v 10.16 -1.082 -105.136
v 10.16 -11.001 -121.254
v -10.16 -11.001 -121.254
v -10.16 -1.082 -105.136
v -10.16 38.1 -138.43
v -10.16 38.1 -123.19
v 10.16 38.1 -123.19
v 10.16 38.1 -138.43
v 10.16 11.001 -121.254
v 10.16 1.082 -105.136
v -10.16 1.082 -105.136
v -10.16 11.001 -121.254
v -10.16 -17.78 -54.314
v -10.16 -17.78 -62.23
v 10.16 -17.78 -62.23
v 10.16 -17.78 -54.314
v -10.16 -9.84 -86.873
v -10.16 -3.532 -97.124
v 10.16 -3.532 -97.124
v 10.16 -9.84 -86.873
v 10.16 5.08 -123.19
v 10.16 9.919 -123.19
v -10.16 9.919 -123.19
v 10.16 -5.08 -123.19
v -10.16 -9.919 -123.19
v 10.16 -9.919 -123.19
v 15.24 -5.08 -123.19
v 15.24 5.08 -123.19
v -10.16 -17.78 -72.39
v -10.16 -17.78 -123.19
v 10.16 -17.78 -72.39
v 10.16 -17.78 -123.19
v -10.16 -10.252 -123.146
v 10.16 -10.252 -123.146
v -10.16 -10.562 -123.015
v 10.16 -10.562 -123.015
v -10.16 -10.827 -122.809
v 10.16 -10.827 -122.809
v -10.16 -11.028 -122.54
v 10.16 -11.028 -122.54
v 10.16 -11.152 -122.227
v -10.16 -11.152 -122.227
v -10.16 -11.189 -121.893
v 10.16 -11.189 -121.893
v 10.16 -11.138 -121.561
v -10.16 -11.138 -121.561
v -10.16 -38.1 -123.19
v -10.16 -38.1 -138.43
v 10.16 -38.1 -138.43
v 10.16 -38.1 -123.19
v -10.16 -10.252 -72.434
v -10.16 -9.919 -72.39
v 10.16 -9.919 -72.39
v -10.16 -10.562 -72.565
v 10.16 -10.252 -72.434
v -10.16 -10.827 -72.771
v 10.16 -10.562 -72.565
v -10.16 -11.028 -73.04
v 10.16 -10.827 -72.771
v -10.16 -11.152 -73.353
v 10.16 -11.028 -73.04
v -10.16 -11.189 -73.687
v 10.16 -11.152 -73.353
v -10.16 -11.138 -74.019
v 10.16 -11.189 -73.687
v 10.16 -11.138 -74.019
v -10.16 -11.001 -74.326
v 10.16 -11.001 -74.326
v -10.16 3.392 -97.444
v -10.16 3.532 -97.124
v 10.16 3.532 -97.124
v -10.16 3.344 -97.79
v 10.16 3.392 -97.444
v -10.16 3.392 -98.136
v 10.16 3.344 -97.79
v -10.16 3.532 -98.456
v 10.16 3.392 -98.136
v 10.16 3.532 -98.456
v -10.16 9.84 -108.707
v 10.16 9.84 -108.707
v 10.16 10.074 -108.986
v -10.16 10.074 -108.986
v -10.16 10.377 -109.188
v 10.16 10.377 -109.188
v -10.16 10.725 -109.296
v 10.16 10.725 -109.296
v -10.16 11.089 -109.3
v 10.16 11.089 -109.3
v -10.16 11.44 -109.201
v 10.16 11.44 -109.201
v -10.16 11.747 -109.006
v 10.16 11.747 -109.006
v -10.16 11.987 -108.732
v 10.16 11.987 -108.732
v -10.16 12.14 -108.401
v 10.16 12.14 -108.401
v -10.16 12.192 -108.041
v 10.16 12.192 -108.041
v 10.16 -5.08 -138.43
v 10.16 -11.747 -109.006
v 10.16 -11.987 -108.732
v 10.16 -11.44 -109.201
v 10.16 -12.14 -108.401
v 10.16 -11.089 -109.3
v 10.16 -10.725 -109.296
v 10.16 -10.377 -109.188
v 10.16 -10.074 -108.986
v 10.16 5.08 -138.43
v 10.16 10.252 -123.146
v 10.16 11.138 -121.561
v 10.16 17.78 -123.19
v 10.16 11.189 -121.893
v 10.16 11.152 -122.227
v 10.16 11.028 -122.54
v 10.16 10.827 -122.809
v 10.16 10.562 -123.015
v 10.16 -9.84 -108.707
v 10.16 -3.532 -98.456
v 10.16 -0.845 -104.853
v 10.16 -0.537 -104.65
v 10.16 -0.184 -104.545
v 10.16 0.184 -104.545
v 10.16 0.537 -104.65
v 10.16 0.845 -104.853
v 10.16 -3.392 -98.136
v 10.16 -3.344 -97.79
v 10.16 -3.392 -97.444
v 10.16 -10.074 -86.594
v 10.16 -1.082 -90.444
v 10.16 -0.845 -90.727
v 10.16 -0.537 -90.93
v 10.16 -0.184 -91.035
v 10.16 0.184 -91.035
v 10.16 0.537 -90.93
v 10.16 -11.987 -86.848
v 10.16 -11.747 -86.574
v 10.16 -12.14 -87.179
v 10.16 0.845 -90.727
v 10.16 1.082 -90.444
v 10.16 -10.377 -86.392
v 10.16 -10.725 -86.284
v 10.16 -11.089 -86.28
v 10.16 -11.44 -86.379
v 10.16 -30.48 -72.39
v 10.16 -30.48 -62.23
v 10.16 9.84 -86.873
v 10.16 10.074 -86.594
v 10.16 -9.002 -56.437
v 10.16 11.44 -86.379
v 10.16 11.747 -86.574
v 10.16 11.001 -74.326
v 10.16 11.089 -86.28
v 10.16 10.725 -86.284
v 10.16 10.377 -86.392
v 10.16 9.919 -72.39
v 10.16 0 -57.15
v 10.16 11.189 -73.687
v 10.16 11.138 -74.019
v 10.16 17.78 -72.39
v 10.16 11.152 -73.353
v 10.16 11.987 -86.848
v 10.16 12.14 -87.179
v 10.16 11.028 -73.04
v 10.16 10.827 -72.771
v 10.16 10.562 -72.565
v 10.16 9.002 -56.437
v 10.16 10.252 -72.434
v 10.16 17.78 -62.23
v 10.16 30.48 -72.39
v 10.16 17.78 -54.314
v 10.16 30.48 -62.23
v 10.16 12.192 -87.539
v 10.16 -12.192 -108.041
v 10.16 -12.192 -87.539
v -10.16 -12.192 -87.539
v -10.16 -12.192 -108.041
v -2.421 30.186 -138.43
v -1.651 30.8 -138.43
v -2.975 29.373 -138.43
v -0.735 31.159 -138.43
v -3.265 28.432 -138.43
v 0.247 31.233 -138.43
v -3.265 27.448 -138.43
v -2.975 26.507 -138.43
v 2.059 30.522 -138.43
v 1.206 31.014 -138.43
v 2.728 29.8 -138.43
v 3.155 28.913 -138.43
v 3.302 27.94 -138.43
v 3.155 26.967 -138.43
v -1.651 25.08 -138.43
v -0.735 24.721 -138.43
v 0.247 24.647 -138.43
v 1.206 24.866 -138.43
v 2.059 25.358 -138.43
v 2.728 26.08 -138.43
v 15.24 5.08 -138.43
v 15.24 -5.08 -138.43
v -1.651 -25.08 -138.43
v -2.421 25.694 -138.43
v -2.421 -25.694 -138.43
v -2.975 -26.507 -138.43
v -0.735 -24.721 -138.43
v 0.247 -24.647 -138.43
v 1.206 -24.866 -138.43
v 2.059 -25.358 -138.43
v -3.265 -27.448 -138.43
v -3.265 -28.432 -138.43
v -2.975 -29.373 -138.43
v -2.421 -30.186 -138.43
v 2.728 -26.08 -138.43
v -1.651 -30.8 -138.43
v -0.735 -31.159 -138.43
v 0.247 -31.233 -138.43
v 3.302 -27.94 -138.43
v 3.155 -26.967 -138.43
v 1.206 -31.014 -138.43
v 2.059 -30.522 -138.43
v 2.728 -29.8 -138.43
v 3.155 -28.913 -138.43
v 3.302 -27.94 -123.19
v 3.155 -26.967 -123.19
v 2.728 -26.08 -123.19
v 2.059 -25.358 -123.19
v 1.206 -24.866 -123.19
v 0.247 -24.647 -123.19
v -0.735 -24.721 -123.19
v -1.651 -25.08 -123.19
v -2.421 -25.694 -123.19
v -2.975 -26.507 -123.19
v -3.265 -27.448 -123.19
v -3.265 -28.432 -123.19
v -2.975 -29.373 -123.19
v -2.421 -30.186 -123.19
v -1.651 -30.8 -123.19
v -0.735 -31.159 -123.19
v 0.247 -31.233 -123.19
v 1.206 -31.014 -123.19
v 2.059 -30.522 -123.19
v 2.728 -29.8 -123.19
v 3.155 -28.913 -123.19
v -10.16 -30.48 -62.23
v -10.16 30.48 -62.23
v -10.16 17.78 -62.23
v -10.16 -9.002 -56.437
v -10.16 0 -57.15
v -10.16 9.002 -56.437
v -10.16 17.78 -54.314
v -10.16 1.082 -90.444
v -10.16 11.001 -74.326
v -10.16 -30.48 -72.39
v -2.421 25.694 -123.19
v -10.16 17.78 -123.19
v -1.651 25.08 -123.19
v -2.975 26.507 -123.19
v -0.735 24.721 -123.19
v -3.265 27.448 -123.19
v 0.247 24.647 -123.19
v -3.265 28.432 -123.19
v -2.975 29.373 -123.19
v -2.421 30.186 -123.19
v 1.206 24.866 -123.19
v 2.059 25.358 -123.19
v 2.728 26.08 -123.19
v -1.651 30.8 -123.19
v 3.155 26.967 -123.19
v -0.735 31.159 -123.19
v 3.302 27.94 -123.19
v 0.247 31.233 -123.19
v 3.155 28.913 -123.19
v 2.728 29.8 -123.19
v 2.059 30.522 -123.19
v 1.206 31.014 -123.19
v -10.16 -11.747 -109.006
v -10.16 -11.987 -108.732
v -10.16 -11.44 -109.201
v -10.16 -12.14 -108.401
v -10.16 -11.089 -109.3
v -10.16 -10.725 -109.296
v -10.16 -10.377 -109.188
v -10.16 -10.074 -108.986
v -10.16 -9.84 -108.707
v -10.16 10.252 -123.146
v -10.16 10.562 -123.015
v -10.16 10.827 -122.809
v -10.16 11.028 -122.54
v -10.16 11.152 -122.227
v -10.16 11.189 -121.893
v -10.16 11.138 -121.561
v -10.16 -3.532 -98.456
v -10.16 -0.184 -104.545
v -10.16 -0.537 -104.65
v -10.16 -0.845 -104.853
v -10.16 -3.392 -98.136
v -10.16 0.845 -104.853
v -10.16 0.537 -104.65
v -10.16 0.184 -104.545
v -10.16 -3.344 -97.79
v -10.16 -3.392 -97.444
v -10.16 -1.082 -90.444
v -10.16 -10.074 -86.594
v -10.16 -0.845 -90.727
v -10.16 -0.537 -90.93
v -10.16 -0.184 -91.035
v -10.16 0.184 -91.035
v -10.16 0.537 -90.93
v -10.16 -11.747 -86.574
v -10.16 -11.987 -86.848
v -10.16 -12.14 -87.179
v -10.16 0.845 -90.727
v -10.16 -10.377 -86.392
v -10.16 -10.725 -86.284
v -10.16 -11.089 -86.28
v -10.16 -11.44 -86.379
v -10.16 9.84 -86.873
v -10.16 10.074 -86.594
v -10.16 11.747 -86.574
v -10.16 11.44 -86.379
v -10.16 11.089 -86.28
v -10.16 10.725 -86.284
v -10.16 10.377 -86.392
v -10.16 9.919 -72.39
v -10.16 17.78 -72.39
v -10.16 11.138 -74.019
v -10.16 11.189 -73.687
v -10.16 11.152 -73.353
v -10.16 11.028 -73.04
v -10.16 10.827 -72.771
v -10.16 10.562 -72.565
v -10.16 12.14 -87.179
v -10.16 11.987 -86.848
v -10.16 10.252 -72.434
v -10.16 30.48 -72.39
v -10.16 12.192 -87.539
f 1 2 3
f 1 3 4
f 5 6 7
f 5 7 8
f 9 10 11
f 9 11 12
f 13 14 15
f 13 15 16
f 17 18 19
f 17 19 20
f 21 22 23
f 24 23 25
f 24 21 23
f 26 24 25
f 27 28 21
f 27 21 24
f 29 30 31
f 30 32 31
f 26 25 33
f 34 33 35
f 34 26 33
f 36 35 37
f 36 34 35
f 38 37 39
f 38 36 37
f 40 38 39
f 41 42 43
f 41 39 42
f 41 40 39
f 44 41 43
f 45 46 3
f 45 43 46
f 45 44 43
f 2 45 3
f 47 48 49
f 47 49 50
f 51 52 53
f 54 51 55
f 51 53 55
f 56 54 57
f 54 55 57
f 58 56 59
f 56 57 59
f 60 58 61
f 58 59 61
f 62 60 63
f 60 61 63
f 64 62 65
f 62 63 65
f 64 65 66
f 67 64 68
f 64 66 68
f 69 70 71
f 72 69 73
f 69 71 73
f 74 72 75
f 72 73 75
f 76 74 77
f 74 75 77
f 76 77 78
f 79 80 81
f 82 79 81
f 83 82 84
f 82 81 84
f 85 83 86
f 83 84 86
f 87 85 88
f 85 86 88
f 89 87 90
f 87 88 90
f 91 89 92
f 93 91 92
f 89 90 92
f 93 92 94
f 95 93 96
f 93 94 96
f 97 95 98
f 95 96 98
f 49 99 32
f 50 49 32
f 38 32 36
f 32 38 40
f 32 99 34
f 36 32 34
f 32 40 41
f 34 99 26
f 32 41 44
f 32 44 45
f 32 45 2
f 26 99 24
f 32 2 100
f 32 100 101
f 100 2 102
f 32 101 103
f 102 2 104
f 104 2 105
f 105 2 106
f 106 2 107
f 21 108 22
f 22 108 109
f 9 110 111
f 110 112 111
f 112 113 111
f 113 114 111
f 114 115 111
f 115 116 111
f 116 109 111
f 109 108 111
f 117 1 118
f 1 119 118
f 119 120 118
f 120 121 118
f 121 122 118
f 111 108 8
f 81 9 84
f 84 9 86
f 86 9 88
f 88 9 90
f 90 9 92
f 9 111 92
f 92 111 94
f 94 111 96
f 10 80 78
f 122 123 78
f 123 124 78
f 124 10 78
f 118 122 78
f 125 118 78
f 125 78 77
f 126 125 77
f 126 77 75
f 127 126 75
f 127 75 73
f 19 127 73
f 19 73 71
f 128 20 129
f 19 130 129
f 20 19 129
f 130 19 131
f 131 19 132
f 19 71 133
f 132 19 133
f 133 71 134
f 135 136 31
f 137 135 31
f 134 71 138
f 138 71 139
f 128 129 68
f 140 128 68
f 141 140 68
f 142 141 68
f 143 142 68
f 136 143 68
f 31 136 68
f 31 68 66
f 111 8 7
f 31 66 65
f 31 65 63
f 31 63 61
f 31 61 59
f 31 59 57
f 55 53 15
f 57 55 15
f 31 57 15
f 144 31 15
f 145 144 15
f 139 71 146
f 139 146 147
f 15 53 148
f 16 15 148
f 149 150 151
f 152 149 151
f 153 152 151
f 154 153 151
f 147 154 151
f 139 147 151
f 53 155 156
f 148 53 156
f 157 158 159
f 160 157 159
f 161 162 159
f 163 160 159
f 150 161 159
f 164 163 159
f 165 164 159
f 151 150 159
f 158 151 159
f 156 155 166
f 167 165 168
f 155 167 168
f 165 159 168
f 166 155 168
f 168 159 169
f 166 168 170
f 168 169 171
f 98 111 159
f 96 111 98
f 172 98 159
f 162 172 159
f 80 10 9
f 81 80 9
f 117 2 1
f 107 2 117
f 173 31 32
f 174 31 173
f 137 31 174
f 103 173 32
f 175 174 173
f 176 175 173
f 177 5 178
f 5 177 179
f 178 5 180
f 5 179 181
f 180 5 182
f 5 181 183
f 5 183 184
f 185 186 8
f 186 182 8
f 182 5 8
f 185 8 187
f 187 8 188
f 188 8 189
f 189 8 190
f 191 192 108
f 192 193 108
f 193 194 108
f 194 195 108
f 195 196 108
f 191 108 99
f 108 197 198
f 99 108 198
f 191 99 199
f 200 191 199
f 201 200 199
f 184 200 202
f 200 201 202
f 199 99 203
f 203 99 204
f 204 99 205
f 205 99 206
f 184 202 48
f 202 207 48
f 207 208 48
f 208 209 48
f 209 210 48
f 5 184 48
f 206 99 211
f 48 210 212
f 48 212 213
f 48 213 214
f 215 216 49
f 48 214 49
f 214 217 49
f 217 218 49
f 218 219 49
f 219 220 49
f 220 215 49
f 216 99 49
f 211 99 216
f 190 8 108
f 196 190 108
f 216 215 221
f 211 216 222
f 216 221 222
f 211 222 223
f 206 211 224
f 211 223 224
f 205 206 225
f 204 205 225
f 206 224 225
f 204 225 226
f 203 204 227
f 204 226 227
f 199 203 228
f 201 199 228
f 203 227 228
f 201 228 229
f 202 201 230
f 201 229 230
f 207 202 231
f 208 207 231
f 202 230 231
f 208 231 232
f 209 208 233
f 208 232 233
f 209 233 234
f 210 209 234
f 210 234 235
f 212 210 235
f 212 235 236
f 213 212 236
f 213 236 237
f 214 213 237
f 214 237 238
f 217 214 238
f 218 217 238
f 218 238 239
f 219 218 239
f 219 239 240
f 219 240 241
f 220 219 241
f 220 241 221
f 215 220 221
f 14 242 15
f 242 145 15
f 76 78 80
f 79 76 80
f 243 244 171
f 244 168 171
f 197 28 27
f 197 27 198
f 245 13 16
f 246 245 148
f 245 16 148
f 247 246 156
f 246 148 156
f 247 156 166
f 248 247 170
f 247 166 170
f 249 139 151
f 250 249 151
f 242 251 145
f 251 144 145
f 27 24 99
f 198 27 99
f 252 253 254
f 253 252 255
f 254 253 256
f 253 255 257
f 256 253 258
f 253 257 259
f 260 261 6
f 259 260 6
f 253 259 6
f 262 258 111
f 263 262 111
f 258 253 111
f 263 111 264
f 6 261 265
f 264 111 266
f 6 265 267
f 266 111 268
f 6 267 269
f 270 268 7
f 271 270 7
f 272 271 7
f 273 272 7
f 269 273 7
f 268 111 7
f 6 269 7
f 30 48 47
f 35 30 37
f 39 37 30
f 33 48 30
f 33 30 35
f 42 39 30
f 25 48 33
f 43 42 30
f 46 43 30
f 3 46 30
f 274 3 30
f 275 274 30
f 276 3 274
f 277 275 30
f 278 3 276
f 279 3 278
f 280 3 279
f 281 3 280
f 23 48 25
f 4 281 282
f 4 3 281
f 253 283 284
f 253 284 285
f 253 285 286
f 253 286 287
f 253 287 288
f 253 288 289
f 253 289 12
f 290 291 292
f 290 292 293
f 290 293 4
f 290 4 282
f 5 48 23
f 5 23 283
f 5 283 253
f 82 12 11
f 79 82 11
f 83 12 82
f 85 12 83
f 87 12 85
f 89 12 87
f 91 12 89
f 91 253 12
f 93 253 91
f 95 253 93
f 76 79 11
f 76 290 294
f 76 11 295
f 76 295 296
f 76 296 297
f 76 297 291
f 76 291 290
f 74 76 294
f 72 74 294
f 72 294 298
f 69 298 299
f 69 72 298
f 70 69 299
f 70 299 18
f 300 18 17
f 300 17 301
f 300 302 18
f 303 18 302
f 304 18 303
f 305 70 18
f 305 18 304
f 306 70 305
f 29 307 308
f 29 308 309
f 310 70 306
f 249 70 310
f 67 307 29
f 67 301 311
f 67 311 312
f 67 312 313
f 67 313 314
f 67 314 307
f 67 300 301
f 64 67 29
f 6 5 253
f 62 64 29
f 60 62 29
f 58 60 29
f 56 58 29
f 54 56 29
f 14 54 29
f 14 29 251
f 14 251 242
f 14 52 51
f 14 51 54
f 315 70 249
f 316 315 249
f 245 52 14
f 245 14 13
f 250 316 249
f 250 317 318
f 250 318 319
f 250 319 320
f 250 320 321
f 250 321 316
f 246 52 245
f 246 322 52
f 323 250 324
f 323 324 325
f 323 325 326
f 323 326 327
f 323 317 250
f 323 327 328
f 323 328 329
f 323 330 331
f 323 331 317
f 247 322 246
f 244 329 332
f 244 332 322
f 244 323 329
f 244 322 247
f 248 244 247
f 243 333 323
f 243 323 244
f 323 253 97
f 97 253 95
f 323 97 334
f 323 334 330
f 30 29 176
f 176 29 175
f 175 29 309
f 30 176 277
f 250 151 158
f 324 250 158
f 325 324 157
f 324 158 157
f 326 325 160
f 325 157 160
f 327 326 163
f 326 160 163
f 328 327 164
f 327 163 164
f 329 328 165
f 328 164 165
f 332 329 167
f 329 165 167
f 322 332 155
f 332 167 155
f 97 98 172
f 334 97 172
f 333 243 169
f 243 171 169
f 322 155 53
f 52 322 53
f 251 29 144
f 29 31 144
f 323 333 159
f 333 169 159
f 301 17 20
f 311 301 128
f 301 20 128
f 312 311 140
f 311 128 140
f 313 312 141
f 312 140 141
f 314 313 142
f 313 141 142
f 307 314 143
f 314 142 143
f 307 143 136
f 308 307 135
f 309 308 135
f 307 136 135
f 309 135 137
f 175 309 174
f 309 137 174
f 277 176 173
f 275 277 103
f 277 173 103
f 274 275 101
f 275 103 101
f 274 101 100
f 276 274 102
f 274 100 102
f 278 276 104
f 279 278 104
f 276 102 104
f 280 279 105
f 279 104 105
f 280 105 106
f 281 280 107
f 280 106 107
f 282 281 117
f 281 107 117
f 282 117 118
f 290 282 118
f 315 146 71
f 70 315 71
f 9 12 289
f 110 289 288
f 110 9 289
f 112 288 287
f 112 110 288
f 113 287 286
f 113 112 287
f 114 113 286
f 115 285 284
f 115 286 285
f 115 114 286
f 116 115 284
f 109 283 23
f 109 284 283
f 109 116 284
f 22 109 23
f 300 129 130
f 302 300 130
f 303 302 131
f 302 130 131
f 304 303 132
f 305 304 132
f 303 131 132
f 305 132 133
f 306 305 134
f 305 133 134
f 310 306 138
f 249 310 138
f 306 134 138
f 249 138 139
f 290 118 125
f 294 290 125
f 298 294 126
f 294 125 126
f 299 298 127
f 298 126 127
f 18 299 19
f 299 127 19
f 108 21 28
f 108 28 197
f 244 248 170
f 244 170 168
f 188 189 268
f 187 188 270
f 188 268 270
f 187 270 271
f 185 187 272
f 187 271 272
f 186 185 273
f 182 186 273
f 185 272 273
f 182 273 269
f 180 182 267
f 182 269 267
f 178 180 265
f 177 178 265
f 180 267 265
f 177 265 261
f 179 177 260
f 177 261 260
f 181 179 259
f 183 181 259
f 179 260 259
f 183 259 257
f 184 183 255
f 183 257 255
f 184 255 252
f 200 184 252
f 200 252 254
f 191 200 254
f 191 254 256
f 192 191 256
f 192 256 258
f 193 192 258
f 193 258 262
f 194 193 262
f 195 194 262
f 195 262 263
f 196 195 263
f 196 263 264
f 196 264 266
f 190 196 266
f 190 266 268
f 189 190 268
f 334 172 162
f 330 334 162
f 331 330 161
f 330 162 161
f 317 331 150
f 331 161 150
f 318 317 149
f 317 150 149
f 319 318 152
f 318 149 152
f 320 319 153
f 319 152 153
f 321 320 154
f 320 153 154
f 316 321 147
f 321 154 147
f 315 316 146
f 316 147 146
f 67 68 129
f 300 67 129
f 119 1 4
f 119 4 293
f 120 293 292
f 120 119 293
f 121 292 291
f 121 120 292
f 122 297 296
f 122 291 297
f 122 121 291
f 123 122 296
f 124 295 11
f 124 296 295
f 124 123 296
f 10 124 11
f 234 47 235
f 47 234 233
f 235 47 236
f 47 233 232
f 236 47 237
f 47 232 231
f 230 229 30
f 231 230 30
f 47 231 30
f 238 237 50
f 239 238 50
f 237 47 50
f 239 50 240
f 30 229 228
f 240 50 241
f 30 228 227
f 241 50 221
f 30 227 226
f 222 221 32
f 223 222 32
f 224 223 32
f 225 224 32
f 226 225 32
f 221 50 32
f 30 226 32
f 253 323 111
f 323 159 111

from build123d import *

# Parameters (mm, degrees)
BOSS_EXTRUDE1_DEPTH = 10.16
CUT_EXTRUDE1_DEPTH  = 21.32
SKETCH3_R           = 3.302
CUT_EXTRUDE2_DEPTH  = 16.24
SKETCH4_W           = 15.24
SKETCH4_H           = 10.16
BOSS_EXTRUDE2_DEPTH = 5.08


with BuildPart() as part:
    # Sketch1 → Boss-Extrude1 (new body, symmetric)
    with BuildSketch(Plane(origin=(0, 0, 0), x_dir=(0, 0, -1), z_dir=(1, 0, 0))):
        with BuildLine():
            Line((54.313848142, 17.78), (62.23, 17.78))
            Line((62.23, 17.78), (62.23, 30.48))
            Line((62.23, 30.48), (72.39, 30.48))
            Line((72.39, 30.48), (72.39, 17.78))
            Line((72.39, 17.78), (123.19, 17.78))
            Line((123.19, 17.78), (123.19, 38.1))
            Line((123.19, 38.1), (138.43, 38.1))
            Line((138.43, 38.1), (138.43, -38.1))
            Line((138.43, -38.1), (123.19, -38.1))
            Line((123.19, -38.1), (123.19, -17.78))
            Line((123.19, -17.78), (72.39, -17.78))
            Line((72.39, -17.78), (72.39, -30.48))
            Line((72.39, -30.48), (62.23, -30.48))
            Line((62.23, -30.48), (62.23, -17.78))
            Line((62.23, -17.78), (54.313848142, -17.78))
            ThreePointArc((54.313848142, -17.78), (57.15, 0), (54.313848142, 17.78))
        make_face()
    extrude(amount=BOSS_EXTRUDE1_DEPTH, both=True)

    # Sketch2 → Cut-Extrude1 (cut, through all)
    with BuildSketch(Plane(origin=(10.16, 0, 0), x_dir=(0, 0, -1), z_dir=(1, 0, 0))):
        with BuildLine():
            Line((72.39, 9.91925318), (72.39, -9.91925318))
            ThreePointArc((72.39, -9.91925318), (73.040490814, -11.02790478), (74.325603731, -11.000859243))
            Line((74.325603731, -11.000859243), (90.444390149, -1.081606062))
            ThreePointArc((90.444390149, -1.081606062), (91.048786418, 0), (90.444390149, 1.081606062))
            Line((90.444390149, 1.081606062), (74.325603731, 11.000859243))
            ThreePointArc((74.325603731, 11.000859243), (73.040490814, 11.02790478), (72.39, 9.91925318))
        make_face()
        with BuildLine():
            Line((123.19, 9.91925318), (123.19, -9.91925318))
            ThreePointArc((123.19, -9.91925318), (122.539509186, -11.02790478), (121.254396269, -11.000859243))
            Line((121.254396269, -11.000859243), (105.135609851, -1.081606062))
            ThreePointArc((105.135609851, -1.081606062), (104.531213582, 0), (105.135609851, 1.081606062))
            Line((105.135609851, 1.081606062), (121.254396269, 11.000859243))
            ThreePointArc((121.254396269, 11.000859243), (122.539509186, 11.02790478), (123.19, 9.91925318))
        make_face()
        with BuildLine():
            Line((86.873499611, 9.840393938), (97.124396269, 3.53214984))
            ThreePointArc((97.124396269, 3.53214984), (97.79, 3.343755902), (98.455603731, 3.53214984))
            Line((98.455603731, 3.53214984), (108.706500389, 9.840393938))
            ThreePointArc((108.706500389, 9.840393938), (109.262890869, 11.267875918), (108.040896659, 12.192))
            Line((108.040896659, 12.192), (87.539103341, 12.192))
            ThreePointArc((87.539103341, 12.192), (86.317109131, 11.267875918), (86.873499611, 9.840393938))
        make_face()
        with BuildLine():
            Line((87.539103341, -12.192), (108.040896659, -12.192))
            ThreePointArc((108.040896659, -12.192), (109.262890869, -11.267875918), (108.706500389, -9.840393938))
            Line((108.706500389, -9.840393938), (98.455603731, -3.53214984))
            ThreePointArc((98.455603731, -3.53214984), (97.79, -3.343755902), (97.124396269, -3.53214984))
            Line((97.124396269, -3.53214984), (86.873499611, -9.840393938))
            ThreePointArc((86.873499611, -9.840393938), (86.317109131, -11.267875918), (87.539103341, -12.192))
        make_face()
    extrude(amount=-CUT_EXTRUDE1_DEPTH, mode=Mode.SUBTRACT)

    # Sketch3 → Cut-Extrude2 (cut, through all)
    with BuildSketch(Plane.XY.offset(-123.19)):
        with Locations((0, 27.94)):
            Circle(SKETCH3_R)
        with Locations((0, -27.94)):
            Circle(SKETCH3_R)
    extrude(amount=-CUT_EXTRUDE2_DEPTH, mode=Mode.SUBTRACT)

    # Sketch4 → Boss-Extrude2 (add)
    with BuildSketch(Plane(origin=(10.16, 0, 0), x_dir=(0, 0, -1), z_dir=(1, 0, 0))):
        with Locations((130.81, 0)):
            Rectangle(SKETCH4_W, SKETCH4_H)
    extrude(amount=BOSS_EXTRUDE2_DEPTH)


solid = part.part
